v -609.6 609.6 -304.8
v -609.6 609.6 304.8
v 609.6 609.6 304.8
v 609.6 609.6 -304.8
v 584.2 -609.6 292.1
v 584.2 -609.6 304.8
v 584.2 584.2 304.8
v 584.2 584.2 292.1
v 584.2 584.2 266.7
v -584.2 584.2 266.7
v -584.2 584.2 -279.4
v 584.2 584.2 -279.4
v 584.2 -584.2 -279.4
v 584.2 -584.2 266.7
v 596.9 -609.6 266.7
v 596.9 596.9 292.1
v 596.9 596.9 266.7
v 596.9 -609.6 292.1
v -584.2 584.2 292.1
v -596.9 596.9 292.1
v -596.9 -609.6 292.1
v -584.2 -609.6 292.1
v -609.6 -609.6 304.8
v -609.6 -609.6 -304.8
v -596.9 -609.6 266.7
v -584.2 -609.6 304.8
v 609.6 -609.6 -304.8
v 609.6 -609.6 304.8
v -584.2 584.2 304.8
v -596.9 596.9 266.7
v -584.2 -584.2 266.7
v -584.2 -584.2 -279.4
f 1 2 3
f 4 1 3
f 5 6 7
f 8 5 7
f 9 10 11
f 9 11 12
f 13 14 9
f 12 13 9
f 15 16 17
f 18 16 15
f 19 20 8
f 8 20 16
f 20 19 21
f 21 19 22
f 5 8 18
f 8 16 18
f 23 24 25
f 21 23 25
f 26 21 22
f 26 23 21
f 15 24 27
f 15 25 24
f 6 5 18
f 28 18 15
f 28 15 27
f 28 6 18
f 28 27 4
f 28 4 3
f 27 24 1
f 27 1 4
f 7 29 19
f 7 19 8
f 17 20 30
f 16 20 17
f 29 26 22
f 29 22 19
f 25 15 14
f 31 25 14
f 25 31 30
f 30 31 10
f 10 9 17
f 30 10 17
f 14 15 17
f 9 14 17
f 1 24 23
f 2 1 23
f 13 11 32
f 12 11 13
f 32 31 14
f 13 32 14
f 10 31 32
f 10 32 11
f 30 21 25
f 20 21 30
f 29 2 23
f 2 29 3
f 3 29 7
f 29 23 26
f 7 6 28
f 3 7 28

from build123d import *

# Parameters (mm, degrees)
F0_W      = 1219.2
F0_H      = 609.6
F1_DEPTH  = 609.6
F2_W      = 1168.4
F2_H      = 1168.4
F3_DEPTH  = 584.2
F4_W      = 1168.4
F4_H      = 25.4
F5_DEPTH  = 38.1
F7_DEPTH  = 12.7
F9_DEPTH  = 12.7
F11_DEPTH = 12.7


with BuildPart() as f1:
    # F0 (on Front) → F1 (new body, symmetric)
    with BuildSketch(Plane.XZ):
        Rectangle(F0_W, F0_H)
    extrude(amount=F1_DEPTH, both=True)

    # F2 (on face) → F3 (cut)
    with BuildSketch(Plane.XY.offset(304.8)):
        Rectangle(F2_W, F2_H)
    extrude(amount=-F3_DEPTH, mode=Mode.SUBTRACT)

    # F4 (on face) → F5 (cut)
    with BuildSketch(Plane.XY.offset(304.8)):
        with Locations((0, -596.9)):
            Rectangle(F4_W, F4_H)
    extrude(amount=-F5_DEPTH, mode=Mode.SUBTRACT)

    # F6 (on face) → F7 (cut)
    with BuildSketch(Plane.YZ.offset(-584.2)):
        Polygon((-609.6, 292.1), (-609.6, 266.7), (-584.2, 266.7), (584.2, 266.7), (584.2, 292.1), align=None)
    extrude(amount=-F7_DEPTH, mode=Mode.SUBTRACT)

    # F8 (on face) → F9 (cut)
    with BuildSketch(Plane.XZ.offset(-584.2)):
        Polygon((-596.9, 292.1), (-596.9, 266.7), (-584.2, 266.7), (584.2, 266.7), (584.2, 292.1), (-584.2, 292.1), align=None)
    extrude(amount=-F9_DEPTH, mode=Mode.SUBTRACT)

    # F10 (on face) → F11 (cut)
    with BuildSketch(Plane(origin=(584.2, 0, 0), x_dir=(0, -1, 0), z_dir=(-1, 0, 0))):
        Polygon((-596.9, 292.1), (-596.9, 266.7), (-584.2, 266.7), (584.2, 266.7), (609.6, 266.7), (609.6, 292.1), (-584.2, 292.1), align=None)
    extrude(amount=-F11_DEPTH, mode=Mode.SUBTRACT)


solid = f1.part
